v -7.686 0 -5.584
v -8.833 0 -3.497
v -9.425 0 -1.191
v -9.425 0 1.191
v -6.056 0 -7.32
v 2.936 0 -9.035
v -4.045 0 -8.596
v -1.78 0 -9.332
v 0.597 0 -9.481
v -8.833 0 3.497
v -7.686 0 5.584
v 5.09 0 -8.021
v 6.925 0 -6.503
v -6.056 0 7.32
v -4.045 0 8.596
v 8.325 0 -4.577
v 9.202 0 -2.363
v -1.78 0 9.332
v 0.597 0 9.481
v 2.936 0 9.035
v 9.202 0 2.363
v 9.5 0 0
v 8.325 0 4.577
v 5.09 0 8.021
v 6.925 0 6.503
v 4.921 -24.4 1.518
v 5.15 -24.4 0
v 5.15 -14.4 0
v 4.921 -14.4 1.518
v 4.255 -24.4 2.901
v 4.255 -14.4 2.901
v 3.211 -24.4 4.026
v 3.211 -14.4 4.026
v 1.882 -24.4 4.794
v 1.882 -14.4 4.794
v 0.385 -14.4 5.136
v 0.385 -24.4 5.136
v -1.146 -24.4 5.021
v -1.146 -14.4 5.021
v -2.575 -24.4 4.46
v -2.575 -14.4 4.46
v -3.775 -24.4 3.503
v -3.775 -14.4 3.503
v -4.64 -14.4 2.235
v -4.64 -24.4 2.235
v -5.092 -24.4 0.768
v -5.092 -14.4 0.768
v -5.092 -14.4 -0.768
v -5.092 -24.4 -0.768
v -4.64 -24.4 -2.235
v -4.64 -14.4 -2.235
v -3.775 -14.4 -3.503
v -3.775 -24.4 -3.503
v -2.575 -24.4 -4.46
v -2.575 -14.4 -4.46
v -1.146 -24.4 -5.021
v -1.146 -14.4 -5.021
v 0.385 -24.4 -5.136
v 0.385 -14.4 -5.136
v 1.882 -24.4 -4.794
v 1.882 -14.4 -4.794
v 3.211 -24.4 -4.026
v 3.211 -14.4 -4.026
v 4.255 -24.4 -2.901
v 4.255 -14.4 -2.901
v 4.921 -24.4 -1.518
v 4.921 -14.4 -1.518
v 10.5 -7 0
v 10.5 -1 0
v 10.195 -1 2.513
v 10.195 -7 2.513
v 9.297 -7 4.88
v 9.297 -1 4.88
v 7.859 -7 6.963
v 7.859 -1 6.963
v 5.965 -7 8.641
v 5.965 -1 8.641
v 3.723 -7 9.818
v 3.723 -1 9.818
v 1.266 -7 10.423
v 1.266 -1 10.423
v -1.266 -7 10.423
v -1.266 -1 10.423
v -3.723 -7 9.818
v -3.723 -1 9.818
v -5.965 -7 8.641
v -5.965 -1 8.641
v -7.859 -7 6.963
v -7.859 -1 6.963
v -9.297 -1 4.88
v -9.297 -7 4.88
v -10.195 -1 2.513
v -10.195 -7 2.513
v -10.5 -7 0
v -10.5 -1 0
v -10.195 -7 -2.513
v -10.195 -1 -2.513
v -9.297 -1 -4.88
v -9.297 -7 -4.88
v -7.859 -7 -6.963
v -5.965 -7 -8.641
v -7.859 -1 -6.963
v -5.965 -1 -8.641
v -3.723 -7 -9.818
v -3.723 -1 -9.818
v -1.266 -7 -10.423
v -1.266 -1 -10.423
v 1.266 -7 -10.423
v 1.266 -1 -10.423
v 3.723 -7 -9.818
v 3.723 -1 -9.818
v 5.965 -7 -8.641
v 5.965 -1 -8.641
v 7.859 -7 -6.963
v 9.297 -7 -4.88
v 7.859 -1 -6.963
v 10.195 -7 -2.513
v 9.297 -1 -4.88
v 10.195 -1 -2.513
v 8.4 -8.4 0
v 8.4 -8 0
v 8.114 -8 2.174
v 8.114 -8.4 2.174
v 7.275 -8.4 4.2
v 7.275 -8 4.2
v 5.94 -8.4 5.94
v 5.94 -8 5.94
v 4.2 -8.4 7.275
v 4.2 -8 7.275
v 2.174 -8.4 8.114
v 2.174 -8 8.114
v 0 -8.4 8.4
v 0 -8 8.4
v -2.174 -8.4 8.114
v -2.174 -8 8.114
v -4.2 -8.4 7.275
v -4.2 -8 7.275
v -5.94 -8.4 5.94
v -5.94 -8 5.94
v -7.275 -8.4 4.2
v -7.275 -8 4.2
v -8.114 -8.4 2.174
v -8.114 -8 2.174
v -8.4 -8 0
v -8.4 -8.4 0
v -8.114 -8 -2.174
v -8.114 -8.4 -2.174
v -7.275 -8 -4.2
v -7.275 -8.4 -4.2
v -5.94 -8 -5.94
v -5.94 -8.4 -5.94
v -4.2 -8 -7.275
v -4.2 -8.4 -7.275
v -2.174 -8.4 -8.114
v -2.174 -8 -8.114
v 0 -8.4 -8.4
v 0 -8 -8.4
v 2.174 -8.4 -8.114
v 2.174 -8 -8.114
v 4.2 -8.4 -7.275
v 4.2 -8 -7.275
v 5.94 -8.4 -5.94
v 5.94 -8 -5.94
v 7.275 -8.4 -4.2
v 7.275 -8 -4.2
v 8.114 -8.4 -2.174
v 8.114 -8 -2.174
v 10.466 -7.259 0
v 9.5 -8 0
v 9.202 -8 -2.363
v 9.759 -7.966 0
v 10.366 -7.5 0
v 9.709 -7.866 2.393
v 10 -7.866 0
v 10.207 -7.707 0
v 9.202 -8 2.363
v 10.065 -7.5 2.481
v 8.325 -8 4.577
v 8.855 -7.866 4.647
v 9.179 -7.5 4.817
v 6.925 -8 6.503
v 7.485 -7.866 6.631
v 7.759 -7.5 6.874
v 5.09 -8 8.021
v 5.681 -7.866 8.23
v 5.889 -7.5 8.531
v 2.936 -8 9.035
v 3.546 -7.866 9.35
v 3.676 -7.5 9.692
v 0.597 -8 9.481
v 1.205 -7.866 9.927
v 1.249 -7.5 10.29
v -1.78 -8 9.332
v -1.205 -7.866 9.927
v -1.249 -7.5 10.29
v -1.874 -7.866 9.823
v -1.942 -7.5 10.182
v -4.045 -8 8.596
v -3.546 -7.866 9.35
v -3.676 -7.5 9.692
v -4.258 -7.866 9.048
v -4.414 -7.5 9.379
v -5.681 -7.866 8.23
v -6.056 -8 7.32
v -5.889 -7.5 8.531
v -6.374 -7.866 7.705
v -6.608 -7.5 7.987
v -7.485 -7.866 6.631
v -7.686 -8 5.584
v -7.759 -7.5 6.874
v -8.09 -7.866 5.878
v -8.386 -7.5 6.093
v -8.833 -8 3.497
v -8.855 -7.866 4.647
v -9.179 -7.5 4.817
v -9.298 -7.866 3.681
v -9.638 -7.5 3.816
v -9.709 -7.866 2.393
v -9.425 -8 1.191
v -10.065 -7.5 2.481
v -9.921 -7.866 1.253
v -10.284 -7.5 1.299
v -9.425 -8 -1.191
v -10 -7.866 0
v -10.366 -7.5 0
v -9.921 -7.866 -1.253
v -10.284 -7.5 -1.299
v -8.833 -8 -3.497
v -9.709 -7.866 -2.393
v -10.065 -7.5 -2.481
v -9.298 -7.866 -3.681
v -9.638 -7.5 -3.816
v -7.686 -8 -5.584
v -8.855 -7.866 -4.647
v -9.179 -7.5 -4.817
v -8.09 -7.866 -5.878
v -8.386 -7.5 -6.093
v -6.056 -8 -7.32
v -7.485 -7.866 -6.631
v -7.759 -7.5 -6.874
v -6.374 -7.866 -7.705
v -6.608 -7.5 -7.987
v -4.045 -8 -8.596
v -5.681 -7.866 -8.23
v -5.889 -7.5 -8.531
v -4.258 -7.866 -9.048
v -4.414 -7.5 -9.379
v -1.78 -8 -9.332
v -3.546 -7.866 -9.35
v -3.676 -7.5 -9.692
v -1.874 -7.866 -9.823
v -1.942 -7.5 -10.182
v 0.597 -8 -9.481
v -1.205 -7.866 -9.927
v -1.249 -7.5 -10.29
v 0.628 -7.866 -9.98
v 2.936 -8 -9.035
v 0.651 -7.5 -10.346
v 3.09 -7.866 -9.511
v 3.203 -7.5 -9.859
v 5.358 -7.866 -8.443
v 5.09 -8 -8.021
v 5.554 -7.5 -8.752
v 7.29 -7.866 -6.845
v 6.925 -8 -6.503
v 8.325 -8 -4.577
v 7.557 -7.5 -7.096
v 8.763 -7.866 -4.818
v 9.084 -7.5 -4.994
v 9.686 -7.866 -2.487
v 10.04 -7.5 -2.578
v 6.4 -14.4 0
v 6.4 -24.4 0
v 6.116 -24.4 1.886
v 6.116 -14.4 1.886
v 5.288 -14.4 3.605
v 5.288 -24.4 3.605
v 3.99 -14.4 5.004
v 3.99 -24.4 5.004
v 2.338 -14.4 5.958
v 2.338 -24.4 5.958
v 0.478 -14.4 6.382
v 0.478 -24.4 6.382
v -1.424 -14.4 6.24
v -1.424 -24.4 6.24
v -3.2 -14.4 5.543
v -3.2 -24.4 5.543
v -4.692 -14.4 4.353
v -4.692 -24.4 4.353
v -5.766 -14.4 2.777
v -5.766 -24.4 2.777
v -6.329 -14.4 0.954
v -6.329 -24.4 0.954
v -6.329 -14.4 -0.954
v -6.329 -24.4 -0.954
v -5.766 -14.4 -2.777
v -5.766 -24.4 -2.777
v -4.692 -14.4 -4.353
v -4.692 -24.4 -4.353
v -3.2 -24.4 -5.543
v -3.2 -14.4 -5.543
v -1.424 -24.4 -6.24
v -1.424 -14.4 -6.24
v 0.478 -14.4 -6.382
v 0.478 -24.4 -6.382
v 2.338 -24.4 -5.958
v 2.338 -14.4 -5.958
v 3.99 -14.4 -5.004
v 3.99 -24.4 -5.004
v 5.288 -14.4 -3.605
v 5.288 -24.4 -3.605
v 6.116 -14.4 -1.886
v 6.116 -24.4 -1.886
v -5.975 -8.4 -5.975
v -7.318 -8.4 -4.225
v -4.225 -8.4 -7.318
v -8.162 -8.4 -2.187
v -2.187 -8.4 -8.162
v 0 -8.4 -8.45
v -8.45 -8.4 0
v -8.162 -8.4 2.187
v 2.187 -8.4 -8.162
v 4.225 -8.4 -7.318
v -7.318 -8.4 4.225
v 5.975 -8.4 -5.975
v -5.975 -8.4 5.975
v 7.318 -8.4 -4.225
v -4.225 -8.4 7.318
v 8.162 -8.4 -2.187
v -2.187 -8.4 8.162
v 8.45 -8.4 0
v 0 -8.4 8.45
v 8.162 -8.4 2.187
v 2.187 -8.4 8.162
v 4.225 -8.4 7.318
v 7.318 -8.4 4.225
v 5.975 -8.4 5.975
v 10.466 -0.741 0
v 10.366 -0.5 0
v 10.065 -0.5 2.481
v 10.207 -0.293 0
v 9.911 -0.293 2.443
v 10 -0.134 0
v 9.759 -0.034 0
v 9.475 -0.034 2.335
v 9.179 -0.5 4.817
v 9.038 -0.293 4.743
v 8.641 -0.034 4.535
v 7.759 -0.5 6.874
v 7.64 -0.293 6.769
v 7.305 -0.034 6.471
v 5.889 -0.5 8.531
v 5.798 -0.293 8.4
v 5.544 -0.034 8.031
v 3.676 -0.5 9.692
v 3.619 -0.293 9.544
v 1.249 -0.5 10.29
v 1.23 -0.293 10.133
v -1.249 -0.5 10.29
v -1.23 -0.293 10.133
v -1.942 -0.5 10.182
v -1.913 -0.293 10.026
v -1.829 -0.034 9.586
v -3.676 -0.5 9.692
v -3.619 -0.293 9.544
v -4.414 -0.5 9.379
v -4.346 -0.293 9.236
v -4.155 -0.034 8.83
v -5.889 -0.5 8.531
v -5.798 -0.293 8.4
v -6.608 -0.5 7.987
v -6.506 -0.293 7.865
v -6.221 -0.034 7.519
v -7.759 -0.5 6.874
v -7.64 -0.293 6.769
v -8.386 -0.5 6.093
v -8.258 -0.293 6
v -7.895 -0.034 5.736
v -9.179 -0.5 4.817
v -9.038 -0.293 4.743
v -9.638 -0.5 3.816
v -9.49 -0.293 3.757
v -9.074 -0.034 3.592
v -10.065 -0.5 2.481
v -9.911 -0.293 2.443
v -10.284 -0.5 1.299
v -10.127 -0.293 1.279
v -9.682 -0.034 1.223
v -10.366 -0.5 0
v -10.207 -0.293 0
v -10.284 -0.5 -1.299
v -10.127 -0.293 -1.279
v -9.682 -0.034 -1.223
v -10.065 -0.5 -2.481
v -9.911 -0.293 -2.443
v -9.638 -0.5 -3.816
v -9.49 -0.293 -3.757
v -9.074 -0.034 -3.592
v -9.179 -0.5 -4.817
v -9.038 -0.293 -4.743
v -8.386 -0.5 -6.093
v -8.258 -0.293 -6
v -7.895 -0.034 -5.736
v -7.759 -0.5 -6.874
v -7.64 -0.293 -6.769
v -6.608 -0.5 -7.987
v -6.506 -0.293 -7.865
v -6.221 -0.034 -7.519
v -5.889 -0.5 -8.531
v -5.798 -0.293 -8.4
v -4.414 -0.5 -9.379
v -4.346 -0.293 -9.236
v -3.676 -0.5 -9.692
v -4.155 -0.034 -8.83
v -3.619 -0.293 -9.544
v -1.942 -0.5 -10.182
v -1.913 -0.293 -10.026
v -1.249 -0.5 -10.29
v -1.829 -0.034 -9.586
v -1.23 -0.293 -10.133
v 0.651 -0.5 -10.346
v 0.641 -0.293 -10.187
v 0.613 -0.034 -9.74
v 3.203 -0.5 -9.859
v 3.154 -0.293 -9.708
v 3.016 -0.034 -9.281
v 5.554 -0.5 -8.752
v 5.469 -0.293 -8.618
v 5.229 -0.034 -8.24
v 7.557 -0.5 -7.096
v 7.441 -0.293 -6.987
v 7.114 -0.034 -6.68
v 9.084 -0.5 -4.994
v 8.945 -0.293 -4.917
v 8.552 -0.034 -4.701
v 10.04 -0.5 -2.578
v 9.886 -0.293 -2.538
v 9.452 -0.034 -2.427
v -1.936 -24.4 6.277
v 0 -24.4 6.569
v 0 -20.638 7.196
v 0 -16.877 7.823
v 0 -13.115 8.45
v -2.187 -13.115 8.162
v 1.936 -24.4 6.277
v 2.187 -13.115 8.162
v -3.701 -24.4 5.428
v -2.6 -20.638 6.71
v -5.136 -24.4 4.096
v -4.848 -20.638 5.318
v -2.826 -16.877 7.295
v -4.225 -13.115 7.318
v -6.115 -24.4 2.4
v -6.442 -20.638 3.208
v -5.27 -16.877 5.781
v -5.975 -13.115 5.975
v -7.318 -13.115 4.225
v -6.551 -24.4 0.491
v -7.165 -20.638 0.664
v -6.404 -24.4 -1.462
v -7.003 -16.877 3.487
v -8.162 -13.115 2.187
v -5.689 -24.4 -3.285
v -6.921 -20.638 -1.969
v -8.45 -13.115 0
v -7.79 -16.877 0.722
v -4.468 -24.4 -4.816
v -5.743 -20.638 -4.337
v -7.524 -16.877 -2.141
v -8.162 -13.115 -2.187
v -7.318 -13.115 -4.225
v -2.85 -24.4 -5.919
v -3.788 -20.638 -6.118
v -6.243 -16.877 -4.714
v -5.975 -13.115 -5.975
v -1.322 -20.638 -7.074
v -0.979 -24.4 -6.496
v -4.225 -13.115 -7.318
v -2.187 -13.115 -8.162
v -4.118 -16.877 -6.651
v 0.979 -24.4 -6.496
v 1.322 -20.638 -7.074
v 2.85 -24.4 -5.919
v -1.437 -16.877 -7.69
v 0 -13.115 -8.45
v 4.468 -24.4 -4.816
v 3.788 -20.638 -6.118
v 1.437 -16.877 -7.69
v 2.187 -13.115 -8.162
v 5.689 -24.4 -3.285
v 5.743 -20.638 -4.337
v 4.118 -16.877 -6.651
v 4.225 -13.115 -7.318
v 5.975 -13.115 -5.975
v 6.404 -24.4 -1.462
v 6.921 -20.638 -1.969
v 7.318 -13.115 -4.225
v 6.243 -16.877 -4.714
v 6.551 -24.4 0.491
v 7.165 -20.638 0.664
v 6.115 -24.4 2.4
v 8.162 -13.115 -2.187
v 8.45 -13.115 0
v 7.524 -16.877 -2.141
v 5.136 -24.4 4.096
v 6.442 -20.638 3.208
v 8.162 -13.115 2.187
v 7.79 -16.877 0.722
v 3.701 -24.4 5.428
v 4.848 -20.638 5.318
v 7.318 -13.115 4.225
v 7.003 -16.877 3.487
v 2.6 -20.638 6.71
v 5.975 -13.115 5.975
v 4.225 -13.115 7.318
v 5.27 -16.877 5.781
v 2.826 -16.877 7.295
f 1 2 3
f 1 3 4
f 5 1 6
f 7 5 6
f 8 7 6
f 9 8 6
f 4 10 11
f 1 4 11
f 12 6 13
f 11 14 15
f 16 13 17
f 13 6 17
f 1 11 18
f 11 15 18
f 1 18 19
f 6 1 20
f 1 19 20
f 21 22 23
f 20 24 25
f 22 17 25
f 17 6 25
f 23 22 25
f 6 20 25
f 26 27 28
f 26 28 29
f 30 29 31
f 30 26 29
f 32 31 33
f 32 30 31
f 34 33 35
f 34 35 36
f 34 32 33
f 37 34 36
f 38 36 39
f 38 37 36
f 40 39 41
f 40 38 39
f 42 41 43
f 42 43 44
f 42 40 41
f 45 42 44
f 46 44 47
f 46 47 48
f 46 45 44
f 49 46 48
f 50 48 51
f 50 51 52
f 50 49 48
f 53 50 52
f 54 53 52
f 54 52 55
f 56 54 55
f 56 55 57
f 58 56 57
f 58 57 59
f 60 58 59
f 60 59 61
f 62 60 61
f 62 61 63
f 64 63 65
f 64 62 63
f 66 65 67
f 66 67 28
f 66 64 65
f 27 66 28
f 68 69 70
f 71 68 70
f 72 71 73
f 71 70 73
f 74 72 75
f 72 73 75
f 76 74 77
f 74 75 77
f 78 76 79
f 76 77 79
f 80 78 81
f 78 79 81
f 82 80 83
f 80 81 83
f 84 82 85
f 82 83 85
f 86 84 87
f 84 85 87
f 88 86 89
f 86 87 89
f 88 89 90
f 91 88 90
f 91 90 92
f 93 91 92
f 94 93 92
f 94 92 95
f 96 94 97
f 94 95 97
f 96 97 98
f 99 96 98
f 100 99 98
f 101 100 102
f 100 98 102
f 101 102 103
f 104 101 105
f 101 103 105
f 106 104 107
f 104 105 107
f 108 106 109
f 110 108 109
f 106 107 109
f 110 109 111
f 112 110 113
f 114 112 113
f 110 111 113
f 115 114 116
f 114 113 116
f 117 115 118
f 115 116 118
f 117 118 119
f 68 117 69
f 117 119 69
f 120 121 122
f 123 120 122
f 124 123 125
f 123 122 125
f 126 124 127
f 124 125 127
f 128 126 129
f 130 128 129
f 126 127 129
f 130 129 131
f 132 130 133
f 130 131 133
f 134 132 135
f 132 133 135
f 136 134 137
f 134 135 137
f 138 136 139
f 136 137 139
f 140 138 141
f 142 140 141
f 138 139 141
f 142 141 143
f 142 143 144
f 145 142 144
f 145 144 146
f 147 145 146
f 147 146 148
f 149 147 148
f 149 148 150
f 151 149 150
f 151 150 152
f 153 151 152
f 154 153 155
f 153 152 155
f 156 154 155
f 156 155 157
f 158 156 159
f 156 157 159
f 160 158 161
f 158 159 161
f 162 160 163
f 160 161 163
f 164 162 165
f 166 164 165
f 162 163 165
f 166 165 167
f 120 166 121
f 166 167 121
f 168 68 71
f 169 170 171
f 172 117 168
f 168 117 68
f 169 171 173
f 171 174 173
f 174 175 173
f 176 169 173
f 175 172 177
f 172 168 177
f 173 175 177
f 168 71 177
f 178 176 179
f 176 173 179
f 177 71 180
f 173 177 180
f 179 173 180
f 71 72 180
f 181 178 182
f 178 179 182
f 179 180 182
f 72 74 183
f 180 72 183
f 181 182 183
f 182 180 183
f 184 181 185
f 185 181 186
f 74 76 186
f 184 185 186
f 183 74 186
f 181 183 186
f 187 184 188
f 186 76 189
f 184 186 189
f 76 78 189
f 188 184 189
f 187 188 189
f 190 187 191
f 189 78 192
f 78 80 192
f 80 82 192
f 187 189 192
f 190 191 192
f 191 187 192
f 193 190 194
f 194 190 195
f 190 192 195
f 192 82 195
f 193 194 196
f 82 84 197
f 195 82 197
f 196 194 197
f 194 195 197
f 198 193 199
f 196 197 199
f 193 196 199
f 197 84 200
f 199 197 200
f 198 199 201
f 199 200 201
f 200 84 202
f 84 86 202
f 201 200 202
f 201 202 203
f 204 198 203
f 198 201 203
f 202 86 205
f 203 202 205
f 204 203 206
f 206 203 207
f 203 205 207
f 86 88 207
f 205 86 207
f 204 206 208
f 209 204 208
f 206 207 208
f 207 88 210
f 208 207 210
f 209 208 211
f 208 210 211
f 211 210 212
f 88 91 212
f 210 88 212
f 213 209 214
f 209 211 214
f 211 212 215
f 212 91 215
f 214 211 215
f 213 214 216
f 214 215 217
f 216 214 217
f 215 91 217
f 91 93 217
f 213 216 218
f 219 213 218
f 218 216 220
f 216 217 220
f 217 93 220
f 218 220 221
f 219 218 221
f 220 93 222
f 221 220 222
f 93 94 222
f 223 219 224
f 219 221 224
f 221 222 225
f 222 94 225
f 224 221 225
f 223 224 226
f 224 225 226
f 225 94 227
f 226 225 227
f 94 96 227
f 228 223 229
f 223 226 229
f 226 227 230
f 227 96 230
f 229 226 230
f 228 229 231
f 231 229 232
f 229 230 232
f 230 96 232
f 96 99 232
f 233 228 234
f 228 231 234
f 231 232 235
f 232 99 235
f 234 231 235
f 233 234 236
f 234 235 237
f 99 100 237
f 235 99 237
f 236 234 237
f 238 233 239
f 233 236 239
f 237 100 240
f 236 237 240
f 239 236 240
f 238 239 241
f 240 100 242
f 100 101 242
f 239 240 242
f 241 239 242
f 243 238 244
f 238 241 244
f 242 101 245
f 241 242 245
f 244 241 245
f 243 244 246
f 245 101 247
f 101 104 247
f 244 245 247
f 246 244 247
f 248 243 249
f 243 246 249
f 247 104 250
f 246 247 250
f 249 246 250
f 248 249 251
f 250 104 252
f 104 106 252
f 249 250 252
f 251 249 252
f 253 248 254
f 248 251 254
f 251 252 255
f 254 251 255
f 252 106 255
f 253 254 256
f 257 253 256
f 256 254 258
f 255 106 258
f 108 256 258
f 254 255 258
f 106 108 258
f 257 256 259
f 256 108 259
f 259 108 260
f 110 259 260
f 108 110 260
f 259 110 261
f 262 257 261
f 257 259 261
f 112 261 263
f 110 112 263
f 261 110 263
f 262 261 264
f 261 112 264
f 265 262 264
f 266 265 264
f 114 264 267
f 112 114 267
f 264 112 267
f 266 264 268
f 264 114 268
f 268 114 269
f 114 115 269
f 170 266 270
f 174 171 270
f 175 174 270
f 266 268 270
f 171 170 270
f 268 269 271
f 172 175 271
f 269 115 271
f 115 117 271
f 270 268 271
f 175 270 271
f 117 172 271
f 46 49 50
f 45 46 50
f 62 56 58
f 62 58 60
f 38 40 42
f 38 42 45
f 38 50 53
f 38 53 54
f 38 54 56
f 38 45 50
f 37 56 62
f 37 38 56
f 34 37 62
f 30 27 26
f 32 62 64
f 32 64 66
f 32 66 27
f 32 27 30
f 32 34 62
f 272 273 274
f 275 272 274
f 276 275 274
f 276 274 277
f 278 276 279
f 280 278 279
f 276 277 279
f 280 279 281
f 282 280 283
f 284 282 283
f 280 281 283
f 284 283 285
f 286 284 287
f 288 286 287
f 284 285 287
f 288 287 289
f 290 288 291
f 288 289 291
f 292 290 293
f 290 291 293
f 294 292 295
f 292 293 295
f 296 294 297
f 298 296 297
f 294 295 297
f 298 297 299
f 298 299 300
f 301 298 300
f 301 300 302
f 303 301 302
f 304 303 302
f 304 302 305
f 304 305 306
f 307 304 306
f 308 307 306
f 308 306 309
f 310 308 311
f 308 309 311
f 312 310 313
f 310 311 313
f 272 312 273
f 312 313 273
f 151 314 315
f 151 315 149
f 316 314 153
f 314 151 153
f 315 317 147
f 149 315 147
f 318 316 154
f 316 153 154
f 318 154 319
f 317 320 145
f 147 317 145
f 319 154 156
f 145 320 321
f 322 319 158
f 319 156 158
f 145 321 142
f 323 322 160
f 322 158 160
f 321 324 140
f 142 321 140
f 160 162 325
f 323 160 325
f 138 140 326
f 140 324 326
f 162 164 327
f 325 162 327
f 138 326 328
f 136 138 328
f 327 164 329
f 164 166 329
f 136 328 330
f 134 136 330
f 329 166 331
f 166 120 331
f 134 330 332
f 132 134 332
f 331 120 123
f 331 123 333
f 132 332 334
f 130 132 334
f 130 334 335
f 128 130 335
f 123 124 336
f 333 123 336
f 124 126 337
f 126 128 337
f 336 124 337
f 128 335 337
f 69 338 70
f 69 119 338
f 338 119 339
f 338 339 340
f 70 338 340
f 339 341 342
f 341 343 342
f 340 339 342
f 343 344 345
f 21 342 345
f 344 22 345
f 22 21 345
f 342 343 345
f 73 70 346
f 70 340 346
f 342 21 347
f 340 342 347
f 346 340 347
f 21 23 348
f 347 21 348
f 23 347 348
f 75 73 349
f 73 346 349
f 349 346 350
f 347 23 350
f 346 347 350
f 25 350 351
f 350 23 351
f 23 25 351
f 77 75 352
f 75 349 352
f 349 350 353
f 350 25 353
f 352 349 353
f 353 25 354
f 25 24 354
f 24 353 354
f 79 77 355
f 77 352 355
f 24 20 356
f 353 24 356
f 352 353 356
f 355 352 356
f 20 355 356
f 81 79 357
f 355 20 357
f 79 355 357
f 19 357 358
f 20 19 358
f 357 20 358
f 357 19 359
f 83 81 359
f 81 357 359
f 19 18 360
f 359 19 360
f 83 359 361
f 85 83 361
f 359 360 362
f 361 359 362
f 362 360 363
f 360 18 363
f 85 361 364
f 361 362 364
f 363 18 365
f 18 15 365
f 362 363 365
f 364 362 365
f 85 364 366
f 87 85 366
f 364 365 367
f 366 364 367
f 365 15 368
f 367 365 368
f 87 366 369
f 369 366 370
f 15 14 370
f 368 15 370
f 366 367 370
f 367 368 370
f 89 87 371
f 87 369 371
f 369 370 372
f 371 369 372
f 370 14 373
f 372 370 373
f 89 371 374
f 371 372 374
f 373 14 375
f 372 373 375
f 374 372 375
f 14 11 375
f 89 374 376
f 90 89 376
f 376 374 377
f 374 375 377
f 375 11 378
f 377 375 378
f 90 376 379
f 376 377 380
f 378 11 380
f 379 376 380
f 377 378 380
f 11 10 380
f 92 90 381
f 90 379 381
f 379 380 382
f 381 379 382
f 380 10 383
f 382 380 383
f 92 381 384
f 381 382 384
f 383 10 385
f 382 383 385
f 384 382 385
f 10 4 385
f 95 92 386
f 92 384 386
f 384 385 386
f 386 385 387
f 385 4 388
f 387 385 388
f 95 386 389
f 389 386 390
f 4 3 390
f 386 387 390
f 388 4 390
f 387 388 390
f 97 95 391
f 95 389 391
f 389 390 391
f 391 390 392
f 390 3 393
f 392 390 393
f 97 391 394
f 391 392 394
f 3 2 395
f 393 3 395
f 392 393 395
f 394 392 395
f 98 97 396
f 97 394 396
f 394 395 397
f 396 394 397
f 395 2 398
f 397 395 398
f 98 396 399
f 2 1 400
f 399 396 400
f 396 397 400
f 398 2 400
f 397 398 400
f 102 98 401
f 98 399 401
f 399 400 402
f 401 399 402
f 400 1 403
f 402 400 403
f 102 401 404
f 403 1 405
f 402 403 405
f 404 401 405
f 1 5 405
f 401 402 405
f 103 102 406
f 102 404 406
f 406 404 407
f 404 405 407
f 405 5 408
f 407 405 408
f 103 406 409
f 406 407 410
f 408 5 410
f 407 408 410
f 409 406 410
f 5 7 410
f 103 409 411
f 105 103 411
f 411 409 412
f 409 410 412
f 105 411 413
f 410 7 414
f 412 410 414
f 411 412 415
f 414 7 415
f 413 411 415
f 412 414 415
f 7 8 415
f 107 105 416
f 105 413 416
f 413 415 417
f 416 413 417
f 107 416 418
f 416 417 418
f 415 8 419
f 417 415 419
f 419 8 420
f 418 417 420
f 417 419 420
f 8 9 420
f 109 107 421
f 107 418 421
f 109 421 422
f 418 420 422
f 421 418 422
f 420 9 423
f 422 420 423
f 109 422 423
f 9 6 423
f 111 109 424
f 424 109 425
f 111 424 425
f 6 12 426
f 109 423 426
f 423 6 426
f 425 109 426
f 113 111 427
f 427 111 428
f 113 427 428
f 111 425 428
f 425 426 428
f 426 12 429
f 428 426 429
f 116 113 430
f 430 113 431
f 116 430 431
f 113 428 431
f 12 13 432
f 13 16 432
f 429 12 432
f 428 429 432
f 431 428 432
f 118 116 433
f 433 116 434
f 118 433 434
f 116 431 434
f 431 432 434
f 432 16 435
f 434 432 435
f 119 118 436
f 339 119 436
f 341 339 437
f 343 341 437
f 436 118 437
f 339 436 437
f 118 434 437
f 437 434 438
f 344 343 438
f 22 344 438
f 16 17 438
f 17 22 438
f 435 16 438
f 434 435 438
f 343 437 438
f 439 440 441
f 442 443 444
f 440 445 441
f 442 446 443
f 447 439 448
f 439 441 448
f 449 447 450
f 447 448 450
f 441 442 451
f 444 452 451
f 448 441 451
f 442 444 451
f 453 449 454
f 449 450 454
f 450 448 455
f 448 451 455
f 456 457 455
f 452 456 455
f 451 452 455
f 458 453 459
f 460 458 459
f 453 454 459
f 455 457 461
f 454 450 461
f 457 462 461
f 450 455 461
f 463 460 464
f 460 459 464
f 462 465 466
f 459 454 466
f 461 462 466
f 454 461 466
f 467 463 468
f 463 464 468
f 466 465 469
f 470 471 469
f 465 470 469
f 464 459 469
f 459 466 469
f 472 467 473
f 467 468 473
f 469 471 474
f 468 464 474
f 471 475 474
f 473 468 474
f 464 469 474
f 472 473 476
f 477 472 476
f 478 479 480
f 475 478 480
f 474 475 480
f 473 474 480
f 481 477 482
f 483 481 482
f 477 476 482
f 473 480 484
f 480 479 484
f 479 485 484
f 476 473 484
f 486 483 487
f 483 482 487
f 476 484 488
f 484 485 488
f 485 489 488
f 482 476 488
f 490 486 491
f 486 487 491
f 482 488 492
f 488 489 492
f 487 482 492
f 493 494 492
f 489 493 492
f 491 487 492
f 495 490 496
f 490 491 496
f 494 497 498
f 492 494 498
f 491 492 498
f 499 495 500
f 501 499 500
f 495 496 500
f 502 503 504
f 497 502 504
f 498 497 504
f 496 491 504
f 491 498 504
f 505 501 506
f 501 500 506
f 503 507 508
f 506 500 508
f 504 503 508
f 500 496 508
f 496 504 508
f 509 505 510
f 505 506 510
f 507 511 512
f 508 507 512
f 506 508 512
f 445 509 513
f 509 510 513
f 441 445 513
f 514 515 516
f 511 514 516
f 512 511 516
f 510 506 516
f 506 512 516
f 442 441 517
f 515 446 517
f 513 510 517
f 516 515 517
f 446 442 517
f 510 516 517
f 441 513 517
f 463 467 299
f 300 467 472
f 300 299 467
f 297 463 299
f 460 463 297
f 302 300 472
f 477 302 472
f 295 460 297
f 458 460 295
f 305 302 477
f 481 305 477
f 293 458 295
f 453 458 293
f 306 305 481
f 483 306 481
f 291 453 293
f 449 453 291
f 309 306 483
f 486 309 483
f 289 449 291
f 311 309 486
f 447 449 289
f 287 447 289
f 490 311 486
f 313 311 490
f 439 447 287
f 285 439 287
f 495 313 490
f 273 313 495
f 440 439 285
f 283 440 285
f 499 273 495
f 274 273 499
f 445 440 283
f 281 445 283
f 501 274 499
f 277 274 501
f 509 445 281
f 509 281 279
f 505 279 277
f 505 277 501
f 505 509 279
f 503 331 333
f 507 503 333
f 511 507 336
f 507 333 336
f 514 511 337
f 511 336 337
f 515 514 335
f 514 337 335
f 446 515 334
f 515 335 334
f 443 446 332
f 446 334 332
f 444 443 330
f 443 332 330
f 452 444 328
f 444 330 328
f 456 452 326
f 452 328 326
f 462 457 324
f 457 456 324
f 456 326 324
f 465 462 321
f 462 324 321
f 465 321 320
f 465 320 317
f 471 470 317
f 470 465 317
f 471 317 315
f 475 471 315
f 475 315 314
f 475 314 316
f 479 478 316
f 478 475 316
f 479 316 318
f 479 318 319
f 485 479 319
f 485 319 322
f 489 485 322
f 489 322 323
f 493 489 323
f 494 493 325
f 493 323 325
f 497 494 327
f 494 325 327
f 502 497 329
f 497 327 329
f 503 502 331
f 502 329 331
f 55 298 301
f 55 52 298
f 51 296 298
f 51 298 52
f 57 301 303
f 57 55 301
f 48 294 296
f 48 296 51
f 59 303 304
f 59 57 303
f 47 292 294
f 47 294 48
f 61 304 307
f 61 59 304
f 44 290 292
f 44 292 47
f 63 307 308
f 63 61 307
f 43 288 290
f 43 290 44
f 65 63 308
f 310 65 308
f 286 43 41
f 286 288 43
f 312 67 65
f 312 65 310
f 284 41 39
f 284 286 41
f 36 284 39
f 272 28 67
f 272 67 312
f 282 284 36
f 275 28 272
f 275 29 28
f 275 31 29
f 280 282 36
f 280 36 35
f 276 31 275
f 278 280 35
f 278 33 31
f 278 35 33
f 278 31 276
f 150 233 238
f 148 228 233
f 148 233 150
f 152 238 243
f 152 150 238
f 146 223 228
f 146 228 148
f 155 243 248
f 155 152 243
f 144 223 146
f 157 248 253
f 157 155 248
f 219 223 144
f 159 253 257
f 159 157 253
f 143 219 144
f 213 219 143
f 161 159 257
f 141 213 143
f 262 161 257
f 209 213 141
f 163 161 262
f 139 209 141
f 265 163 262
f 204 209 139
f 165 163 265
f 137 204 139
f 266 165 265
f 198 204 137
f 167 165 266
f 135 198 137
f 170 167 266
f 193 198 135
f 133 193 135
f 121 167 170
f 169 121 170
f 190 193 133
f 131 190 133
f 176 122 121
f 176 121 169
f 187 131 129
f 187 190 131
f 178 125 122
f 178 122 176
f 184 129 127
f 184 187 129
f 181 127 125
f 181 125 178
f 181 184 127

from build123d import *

# Parameters (mm, degrees)
F0_R     = 10.5
F1_DEPTH = 8
F2_R     = 8.4
F3_DEPTH = 0.4
F4_R     = 8.45
F4_R_2   = 8.4
F5_DEPTH = 16
F6_R     = 6.4
F6_R_2   = 5.15
F7_DEPTH = 10
F10_R    = 1


with BuildPart() as f1:
    # F0 (on Front) → F1 (new body)
    with BuildSketch(Plane.XZ):
        Circle(F0_R)
    extrude(amount=F1_DEPTH)

    # F2 (on face) → F3 (join)
    with BuildSketch(Plane.XZ.offset(8)):
        Circle(F2_R)
    extrude(amount=F3_DEPTH)

    # F4 (on face) → F5 (join)
    with BuildSketch(Plane.XZ.offset(8.4)):
        Circle(F4_R)
        Circle(F4_R_2, mode=Mode.SUBTRACT)
        Circle(F4_R_2)
    extrude(amount=F5_DEPTH)

    # F6 (on face) → F7 (cut)
    with BuildSketch(Plane.XZ.offset(24.4)):
        Circle(F6_R)
        Circle(F6_R_2, mode=Mode.SUBTRACT)
    extrude(amount=-F7_DEPTH, mode=Mode.SUBTRACT)

    # F8 (on Right) → F9 (revolve, cut)
    with BuildSketch(Plane.YZ):
        Polygon((-12.4, 8.569138), (-24.4, 8.569138), (-24.4, 6.569138), align=None)
    revolve(axis=Axis((0, -18.4, 0), (0, -1, 0)), mode=Mode.SUBTRACT)

    # F10
    f10_edges = [f1.edges().sort_by_distance(p)[0] for p in [
        (-10.5, -8, 0),
        (-10.5, 0, 0),
    ]]
    fillet(f10_edges, radius=F10_R)


solid = f1.part
